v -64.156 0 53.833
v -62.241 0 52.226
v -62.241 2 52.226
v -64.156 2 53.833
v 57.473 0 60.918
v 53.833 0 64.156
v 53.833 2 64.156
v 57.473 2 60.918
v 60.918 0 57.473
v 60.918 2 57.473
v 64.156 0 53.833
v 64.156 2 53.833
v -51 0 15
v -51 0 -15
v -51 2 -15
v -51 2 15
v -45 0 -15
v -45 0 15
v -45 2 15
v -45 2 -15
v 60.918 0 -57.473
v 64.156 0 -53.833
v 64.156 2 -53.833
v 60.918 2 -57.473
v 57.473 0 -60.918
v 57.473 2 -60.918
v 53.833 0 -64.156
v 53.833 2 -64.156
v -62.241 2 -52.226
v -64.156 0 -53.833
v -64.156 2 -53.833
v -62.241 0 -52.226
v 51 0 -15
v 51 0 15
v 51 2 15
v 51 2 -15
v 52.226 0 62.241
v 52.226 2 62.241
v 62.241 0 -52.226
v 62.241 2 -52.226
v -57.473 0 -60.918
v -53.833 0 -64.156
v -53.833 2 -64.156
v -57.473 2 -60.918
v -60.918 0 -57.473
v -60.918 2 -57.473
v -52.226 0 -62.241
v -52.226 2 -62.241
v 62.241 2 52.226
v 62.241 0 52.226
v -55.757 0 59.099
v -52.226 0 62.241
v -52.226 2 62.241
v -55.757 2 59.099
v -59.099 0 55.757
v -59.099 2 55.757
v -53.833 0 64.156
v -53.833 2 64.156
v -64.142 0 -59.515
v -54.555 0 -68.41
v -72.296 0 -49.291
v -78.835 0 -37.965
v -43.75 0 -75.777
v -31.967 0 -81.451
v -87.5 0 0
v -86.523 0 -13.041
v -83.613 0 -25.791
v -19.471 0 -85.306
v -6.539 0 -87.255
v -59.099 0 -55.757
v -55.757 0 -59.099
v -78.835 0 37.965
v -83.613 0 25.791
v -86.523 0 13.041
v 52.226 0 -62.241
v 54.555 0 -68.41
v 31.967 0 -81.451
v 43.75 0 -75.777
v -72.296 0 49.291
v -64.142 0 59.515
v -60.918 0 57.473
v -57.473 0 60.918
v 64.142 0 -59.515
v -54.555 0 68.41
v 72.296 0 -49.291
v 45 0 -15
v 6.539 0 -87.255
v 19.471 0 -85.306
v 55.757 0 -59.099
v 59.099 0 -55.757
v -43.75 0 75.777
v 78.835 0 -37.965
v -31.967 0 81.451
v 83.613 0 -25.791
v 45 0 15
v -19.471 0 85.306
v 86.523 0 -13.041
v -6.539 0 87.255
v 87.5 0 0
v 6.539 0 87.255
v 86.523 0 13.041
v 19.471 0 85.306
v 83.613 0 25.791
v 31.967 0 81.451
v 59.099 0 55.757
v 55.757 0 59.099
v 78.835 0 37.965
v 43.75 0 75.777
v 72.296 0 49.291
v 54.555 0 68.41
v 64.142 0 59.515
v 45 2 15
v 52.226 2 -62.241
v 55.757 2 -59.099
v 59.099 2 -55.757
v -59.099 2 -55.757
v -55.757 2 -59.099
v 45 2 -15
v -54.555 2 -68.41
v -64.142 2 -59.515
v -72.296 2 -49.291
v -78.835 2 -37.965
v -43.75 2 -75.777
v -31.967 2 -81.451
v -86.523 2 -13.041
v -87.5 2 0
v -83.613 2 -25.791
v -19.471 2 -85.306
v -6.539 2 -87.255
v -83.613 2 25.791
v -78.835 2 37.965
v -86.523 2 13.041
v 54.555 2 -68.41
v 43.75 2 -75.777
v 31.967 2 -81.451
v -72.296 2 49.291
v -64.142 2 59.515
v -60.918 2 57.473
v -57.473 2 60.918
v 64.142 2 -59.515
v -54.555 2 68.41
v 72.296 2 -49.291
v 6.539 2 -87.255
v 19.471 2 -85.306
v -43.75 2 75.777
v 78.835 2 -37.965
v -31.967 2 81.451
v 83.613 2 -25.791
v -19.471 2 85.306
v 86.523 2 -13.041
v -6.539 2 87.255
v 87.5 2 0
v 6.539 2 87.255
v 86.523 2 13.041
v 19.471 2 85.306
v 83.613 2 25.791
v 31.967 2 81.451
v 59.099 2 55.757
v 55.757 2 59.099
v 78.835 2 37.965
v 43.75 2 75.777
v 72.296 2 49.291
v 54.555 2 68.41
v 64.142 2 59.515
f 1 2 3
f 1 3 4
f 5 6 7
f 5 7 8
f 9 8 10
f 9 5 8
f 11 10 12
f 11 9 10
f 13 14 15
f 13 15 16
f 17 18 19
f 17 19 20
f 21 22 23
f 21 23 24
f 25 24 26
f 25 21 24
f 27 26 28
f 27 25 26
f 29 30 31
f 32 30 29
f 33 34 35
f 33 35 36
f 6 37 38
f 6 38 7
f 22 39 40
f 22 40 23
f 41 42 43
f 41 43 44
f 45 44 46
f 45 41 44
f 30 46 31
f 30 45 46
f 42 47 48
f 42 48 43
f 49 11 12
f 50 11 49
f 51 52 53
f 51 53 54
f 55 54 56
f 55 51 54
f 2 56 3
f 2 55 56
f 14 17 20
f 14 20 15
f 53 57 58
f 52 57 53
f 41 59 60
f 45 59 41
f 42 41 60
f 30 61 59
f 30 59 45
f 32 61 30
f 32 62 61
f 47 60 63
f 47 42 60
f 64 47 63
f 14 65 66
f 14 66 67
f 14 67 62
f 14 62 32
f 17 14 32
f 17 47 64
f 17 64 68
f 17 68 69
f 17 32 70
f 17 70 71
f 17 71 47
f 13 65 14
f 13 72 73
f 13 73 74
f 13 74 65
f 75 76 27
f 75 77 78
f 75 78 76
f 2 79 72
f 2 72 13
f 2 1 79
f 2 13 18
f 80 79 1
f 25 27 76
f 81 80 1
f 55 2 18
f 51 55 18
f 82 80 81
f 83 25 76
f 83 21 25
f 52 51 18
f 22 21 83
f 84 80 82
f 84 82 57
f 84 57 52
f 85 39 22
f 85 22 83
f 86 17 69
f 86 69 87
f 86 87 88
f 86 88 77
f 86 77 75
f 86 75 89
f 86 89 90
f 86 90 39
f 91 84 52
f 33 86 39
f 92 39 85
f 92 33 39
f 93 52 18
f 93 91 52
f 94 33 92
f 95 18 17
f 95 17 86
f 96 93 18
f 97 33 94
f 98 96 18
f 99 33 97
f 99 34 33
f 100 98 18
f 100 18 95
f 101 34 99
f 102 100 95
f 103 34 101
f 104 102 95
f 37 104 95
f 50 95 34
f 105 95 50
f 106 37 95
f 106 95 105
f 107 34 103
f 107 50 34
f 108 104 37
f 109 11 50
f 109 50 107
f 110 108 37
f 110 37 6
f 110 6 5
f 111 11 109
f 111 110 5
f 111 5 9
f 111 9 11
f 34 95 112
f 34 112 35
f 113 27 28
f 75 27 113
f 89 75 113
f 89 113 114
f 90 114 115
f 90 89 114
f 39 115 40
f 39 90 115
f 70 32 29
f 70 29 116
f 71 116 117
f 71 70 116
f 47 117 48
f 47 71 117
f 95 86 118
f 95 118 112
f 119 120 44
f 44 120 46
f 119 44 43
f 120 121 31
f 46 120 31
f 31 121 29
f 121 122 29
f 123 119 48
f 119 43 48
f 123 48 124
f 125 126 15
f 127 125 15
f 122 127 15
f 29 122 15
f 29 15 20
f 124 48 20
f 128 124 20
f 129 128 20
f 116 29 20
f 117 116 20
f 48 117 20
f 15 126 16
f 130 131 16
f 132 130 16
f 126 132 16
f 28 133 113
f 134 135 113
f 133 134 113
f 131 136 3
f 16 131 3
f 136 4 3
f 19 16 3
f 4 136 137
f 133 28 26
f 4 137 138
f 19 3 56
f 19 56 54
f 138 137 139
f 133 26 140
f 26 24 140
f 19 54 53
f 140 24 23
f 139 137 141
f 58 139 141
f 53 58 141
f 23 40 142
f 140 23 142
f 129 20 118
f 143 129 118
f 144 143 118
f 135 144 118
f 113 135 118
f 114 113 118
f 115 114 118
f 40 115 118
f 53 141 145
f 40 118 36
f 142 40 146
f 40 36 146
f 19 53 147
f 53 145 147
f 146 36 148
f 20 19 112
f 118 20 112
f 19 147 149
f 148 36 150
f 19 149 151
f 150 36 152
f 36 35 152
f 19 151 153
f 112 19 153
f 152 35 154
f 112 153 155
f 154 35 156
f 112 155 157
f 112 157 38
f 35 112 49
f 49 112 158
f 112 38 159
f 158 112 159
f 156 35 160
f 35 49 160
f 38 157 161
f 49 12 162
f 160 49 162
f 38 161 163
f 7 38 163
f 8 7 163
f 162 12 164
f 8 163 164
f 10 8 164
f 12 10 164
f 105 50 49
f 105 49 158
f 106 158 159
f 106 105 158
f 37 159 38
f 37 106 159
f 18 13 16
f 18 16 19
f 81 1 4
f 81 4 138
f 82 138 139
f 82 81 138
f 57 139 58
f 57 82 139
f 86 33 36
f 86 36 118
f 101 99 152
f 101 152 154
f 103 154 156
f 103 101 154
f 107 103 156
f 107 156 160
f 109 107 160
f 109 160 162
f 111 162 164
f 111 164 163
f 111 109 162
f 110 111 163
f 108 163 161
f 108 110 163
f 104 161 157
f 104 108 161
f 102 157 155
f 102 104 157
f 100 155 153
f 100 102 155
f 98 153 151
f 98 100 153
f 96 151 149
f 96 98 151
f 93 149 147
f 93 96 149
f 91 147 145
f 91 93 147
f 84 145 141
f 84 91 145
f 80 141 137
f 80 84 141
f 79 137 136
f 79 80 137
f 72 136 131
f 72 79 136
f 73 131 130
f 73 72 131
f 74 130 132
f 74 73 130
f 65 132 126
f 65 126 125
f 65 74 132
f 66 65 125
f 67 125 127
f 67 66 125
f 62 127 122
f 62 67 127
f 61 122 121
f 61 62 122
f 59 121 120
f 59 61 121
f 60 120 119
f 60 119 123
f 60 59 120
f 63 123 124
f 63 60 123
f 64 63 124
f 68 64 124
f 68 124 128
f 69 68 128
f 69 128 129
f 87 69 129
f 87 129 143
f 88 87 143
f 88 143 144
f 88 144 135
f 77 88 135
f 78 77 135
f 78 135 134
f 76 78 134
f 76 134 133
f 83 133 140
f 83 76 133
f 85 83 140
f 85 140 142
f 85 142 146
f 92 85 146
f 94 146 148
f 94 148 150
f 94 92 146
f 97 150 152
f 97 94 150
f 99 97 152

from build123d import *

# Parameters (mm, degrees)
F0_R     = 87.5
F1_DEPTH = 2


# Not quite as in the source:
# - a feature of the source that left no trace in its solid (it failed there, or was rolled back) is left out


with BuildPart() as f1:
    # F0 (on Front) → F1 (new body)
    with BuildSketch(Plane.XZ):
        Circle(F0_R)
        with BuildLine():
            ThreePointArc((-53.8334623112, -64.1562221112), (-59.2201929244, -59.2201929244), (-64.1562221112, -53.8334623112))
            Line((-64.1562221112, -53.8334623112), (-62.2411110034, -52.226493287))
            ThreePointArc((-62.2411110034, -52.226493287), (-57.4524259714, -57.4524259714), (-52.226493287, -62.2411110034))
            Line((-52.226493287, -62.2411110034), (-53.8334623112, -64.1562221112))
        make_face(mode=Mode.SUBTRACT)
        with BuildLine():
            Line((53.8334623112, -64.1562221112), (52.226493287, -62.2411110034))
            ThreePointArc((52.226493287, -62.2411110034), (57.4524259714, -57.4524259714), (62.2411110034, -52.226493287))
            Line((62.2411110034, -52.226493287), (64.1562221112, -53.8334623112))
            ThreePointArc((64.1562221112, -53.8334623112), (59.2201929244, -59.2201929244), (53.8334623112, -64.1562221112))
        make_face(mode=Mode.SUBTRACT)
        Polygon((-45, 15), (-45, 0), (-45, -15), (-51, -15), (-51, 15), align=None, mode=Mode.SUBTRACT)
        with BuildLine():
            ThreePointArc((-64.1562221112, 53.8334623112), (-59.2201929244, 59.2201929244), (-53.8334623112, 64.1562221112))
            Line((-53.8334623112, 64.1562221112), (-52.226493287, 62.2411110034))
            ThreePointArc((-52.226493287, 62.2411110034), (-57.4524259714, 57.4524259714), (-62.2411110034, 52.226493287))
            Line((-62.2411110034, 52.226493287), (-64.1562221112, 53.8334623112))
        make_face(mode=Mode.SUBTRACT)
        Polygon((51, 15), (51, -15), (45, -15), (45, 0), (45, 15), align=None, mode=Mode.SUBTRACT)
        with BuildLine():
            ThreePointArc((53.8334623112, 64.1562221112), (59.2201929244, 59.2201929244), (64.1562221112, 53.8334623112))
            Line((64.1562221112, 53.8334623112), (62.2411110034, 52.226493287))
            ThreePointArc((62.2411110034, 52.226493287), (57.4524259714, 57.4524259714), (52.226493287, 62.2411110034))
            Line((52.226493287, 62.2411110034), (53.8334623112, 64.1562221112))
        make_face(mode=Mode.SUBTRACT)
    extrude(amount=-F1_DEPTH)


solid = f1.part
